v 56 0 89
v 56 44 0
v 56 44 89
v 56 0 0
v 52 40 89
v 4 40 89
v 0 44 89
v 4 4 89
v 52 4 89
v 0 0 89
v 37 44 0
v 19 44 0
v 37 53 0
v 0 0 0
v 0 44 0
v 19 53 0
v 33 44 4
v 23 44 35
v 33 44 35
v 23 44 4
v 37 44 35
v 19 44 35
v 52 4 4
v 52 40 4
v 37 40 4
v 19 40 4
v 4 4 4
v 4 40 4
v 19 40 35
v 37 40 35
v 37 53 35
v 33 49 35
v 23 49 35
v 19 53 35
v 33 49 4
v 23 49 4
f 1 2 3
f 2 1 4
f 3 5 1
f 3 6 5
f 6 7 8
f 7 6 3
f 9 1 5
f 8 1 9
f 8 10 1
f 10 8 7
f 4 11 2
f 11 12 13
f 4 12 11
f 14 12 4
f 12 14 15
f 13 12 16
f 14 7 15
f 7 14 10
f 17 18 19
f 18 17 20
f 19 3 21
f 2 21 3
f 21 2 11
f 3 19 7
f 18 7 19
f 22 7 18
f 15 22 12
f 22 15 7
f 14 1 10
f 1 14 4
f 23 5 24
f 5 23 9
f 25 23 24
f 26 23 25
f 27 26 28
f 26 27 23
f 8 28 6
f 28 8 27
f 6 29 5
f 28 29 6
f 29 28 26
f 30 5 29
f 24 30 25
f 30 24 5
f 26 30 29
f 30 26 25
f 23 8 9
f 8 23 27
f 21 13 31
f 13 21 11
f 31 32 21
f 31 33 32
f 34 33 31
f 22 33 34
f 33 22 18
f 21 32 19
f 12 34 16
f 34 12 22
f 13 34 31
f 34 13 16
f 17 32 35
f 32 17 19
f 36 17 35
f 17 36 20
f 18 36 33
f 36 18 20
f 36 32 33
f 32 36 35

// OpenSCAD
wallThickness = 4;

insideX = 48;
insideY = 36;
insideZ = 85;
inside = [insideX, insideY, insideZ];

outsideX = insideX + (wallThickness * 2);
outsideY = insideY + (wallThickness * 2);
outsideZ = insideZ + wallThickness;
outside = [outsideX, outsideY, outsideZ];

smallInsideX = 10;
smallInsideY = 5;
smallInsideZ = 31;
smallInside = [smallInsideX, smallInsideY, smallInsideZ];

smallOutsideX = smallInsideX + (wallThickness * 2);
smallOutsideY = smallInsideY + (wallThickness * 2);
smallOutsideZ = smallInsideZ + wallThickness;
smallOutside = [smallOutsideX, smallOutsideY, smallOutsideZ];

brushTranslation = [
  (outsideX - smallOutsideX)/2,
  (outsideY - wallThickness),
  0
];

union() {
    difference() {
        cube(outside);
        translate([wallThickness, wallThickness, wallThickness]) {
            cube(inside);
        }
    }
    translate(brushTranslation) {
        difference() {
            cube(smallOutside);
            translate([wallThickness,wallThickness, wallThickness]) {
                cube(smallInside);
            }
        }
    }
}
